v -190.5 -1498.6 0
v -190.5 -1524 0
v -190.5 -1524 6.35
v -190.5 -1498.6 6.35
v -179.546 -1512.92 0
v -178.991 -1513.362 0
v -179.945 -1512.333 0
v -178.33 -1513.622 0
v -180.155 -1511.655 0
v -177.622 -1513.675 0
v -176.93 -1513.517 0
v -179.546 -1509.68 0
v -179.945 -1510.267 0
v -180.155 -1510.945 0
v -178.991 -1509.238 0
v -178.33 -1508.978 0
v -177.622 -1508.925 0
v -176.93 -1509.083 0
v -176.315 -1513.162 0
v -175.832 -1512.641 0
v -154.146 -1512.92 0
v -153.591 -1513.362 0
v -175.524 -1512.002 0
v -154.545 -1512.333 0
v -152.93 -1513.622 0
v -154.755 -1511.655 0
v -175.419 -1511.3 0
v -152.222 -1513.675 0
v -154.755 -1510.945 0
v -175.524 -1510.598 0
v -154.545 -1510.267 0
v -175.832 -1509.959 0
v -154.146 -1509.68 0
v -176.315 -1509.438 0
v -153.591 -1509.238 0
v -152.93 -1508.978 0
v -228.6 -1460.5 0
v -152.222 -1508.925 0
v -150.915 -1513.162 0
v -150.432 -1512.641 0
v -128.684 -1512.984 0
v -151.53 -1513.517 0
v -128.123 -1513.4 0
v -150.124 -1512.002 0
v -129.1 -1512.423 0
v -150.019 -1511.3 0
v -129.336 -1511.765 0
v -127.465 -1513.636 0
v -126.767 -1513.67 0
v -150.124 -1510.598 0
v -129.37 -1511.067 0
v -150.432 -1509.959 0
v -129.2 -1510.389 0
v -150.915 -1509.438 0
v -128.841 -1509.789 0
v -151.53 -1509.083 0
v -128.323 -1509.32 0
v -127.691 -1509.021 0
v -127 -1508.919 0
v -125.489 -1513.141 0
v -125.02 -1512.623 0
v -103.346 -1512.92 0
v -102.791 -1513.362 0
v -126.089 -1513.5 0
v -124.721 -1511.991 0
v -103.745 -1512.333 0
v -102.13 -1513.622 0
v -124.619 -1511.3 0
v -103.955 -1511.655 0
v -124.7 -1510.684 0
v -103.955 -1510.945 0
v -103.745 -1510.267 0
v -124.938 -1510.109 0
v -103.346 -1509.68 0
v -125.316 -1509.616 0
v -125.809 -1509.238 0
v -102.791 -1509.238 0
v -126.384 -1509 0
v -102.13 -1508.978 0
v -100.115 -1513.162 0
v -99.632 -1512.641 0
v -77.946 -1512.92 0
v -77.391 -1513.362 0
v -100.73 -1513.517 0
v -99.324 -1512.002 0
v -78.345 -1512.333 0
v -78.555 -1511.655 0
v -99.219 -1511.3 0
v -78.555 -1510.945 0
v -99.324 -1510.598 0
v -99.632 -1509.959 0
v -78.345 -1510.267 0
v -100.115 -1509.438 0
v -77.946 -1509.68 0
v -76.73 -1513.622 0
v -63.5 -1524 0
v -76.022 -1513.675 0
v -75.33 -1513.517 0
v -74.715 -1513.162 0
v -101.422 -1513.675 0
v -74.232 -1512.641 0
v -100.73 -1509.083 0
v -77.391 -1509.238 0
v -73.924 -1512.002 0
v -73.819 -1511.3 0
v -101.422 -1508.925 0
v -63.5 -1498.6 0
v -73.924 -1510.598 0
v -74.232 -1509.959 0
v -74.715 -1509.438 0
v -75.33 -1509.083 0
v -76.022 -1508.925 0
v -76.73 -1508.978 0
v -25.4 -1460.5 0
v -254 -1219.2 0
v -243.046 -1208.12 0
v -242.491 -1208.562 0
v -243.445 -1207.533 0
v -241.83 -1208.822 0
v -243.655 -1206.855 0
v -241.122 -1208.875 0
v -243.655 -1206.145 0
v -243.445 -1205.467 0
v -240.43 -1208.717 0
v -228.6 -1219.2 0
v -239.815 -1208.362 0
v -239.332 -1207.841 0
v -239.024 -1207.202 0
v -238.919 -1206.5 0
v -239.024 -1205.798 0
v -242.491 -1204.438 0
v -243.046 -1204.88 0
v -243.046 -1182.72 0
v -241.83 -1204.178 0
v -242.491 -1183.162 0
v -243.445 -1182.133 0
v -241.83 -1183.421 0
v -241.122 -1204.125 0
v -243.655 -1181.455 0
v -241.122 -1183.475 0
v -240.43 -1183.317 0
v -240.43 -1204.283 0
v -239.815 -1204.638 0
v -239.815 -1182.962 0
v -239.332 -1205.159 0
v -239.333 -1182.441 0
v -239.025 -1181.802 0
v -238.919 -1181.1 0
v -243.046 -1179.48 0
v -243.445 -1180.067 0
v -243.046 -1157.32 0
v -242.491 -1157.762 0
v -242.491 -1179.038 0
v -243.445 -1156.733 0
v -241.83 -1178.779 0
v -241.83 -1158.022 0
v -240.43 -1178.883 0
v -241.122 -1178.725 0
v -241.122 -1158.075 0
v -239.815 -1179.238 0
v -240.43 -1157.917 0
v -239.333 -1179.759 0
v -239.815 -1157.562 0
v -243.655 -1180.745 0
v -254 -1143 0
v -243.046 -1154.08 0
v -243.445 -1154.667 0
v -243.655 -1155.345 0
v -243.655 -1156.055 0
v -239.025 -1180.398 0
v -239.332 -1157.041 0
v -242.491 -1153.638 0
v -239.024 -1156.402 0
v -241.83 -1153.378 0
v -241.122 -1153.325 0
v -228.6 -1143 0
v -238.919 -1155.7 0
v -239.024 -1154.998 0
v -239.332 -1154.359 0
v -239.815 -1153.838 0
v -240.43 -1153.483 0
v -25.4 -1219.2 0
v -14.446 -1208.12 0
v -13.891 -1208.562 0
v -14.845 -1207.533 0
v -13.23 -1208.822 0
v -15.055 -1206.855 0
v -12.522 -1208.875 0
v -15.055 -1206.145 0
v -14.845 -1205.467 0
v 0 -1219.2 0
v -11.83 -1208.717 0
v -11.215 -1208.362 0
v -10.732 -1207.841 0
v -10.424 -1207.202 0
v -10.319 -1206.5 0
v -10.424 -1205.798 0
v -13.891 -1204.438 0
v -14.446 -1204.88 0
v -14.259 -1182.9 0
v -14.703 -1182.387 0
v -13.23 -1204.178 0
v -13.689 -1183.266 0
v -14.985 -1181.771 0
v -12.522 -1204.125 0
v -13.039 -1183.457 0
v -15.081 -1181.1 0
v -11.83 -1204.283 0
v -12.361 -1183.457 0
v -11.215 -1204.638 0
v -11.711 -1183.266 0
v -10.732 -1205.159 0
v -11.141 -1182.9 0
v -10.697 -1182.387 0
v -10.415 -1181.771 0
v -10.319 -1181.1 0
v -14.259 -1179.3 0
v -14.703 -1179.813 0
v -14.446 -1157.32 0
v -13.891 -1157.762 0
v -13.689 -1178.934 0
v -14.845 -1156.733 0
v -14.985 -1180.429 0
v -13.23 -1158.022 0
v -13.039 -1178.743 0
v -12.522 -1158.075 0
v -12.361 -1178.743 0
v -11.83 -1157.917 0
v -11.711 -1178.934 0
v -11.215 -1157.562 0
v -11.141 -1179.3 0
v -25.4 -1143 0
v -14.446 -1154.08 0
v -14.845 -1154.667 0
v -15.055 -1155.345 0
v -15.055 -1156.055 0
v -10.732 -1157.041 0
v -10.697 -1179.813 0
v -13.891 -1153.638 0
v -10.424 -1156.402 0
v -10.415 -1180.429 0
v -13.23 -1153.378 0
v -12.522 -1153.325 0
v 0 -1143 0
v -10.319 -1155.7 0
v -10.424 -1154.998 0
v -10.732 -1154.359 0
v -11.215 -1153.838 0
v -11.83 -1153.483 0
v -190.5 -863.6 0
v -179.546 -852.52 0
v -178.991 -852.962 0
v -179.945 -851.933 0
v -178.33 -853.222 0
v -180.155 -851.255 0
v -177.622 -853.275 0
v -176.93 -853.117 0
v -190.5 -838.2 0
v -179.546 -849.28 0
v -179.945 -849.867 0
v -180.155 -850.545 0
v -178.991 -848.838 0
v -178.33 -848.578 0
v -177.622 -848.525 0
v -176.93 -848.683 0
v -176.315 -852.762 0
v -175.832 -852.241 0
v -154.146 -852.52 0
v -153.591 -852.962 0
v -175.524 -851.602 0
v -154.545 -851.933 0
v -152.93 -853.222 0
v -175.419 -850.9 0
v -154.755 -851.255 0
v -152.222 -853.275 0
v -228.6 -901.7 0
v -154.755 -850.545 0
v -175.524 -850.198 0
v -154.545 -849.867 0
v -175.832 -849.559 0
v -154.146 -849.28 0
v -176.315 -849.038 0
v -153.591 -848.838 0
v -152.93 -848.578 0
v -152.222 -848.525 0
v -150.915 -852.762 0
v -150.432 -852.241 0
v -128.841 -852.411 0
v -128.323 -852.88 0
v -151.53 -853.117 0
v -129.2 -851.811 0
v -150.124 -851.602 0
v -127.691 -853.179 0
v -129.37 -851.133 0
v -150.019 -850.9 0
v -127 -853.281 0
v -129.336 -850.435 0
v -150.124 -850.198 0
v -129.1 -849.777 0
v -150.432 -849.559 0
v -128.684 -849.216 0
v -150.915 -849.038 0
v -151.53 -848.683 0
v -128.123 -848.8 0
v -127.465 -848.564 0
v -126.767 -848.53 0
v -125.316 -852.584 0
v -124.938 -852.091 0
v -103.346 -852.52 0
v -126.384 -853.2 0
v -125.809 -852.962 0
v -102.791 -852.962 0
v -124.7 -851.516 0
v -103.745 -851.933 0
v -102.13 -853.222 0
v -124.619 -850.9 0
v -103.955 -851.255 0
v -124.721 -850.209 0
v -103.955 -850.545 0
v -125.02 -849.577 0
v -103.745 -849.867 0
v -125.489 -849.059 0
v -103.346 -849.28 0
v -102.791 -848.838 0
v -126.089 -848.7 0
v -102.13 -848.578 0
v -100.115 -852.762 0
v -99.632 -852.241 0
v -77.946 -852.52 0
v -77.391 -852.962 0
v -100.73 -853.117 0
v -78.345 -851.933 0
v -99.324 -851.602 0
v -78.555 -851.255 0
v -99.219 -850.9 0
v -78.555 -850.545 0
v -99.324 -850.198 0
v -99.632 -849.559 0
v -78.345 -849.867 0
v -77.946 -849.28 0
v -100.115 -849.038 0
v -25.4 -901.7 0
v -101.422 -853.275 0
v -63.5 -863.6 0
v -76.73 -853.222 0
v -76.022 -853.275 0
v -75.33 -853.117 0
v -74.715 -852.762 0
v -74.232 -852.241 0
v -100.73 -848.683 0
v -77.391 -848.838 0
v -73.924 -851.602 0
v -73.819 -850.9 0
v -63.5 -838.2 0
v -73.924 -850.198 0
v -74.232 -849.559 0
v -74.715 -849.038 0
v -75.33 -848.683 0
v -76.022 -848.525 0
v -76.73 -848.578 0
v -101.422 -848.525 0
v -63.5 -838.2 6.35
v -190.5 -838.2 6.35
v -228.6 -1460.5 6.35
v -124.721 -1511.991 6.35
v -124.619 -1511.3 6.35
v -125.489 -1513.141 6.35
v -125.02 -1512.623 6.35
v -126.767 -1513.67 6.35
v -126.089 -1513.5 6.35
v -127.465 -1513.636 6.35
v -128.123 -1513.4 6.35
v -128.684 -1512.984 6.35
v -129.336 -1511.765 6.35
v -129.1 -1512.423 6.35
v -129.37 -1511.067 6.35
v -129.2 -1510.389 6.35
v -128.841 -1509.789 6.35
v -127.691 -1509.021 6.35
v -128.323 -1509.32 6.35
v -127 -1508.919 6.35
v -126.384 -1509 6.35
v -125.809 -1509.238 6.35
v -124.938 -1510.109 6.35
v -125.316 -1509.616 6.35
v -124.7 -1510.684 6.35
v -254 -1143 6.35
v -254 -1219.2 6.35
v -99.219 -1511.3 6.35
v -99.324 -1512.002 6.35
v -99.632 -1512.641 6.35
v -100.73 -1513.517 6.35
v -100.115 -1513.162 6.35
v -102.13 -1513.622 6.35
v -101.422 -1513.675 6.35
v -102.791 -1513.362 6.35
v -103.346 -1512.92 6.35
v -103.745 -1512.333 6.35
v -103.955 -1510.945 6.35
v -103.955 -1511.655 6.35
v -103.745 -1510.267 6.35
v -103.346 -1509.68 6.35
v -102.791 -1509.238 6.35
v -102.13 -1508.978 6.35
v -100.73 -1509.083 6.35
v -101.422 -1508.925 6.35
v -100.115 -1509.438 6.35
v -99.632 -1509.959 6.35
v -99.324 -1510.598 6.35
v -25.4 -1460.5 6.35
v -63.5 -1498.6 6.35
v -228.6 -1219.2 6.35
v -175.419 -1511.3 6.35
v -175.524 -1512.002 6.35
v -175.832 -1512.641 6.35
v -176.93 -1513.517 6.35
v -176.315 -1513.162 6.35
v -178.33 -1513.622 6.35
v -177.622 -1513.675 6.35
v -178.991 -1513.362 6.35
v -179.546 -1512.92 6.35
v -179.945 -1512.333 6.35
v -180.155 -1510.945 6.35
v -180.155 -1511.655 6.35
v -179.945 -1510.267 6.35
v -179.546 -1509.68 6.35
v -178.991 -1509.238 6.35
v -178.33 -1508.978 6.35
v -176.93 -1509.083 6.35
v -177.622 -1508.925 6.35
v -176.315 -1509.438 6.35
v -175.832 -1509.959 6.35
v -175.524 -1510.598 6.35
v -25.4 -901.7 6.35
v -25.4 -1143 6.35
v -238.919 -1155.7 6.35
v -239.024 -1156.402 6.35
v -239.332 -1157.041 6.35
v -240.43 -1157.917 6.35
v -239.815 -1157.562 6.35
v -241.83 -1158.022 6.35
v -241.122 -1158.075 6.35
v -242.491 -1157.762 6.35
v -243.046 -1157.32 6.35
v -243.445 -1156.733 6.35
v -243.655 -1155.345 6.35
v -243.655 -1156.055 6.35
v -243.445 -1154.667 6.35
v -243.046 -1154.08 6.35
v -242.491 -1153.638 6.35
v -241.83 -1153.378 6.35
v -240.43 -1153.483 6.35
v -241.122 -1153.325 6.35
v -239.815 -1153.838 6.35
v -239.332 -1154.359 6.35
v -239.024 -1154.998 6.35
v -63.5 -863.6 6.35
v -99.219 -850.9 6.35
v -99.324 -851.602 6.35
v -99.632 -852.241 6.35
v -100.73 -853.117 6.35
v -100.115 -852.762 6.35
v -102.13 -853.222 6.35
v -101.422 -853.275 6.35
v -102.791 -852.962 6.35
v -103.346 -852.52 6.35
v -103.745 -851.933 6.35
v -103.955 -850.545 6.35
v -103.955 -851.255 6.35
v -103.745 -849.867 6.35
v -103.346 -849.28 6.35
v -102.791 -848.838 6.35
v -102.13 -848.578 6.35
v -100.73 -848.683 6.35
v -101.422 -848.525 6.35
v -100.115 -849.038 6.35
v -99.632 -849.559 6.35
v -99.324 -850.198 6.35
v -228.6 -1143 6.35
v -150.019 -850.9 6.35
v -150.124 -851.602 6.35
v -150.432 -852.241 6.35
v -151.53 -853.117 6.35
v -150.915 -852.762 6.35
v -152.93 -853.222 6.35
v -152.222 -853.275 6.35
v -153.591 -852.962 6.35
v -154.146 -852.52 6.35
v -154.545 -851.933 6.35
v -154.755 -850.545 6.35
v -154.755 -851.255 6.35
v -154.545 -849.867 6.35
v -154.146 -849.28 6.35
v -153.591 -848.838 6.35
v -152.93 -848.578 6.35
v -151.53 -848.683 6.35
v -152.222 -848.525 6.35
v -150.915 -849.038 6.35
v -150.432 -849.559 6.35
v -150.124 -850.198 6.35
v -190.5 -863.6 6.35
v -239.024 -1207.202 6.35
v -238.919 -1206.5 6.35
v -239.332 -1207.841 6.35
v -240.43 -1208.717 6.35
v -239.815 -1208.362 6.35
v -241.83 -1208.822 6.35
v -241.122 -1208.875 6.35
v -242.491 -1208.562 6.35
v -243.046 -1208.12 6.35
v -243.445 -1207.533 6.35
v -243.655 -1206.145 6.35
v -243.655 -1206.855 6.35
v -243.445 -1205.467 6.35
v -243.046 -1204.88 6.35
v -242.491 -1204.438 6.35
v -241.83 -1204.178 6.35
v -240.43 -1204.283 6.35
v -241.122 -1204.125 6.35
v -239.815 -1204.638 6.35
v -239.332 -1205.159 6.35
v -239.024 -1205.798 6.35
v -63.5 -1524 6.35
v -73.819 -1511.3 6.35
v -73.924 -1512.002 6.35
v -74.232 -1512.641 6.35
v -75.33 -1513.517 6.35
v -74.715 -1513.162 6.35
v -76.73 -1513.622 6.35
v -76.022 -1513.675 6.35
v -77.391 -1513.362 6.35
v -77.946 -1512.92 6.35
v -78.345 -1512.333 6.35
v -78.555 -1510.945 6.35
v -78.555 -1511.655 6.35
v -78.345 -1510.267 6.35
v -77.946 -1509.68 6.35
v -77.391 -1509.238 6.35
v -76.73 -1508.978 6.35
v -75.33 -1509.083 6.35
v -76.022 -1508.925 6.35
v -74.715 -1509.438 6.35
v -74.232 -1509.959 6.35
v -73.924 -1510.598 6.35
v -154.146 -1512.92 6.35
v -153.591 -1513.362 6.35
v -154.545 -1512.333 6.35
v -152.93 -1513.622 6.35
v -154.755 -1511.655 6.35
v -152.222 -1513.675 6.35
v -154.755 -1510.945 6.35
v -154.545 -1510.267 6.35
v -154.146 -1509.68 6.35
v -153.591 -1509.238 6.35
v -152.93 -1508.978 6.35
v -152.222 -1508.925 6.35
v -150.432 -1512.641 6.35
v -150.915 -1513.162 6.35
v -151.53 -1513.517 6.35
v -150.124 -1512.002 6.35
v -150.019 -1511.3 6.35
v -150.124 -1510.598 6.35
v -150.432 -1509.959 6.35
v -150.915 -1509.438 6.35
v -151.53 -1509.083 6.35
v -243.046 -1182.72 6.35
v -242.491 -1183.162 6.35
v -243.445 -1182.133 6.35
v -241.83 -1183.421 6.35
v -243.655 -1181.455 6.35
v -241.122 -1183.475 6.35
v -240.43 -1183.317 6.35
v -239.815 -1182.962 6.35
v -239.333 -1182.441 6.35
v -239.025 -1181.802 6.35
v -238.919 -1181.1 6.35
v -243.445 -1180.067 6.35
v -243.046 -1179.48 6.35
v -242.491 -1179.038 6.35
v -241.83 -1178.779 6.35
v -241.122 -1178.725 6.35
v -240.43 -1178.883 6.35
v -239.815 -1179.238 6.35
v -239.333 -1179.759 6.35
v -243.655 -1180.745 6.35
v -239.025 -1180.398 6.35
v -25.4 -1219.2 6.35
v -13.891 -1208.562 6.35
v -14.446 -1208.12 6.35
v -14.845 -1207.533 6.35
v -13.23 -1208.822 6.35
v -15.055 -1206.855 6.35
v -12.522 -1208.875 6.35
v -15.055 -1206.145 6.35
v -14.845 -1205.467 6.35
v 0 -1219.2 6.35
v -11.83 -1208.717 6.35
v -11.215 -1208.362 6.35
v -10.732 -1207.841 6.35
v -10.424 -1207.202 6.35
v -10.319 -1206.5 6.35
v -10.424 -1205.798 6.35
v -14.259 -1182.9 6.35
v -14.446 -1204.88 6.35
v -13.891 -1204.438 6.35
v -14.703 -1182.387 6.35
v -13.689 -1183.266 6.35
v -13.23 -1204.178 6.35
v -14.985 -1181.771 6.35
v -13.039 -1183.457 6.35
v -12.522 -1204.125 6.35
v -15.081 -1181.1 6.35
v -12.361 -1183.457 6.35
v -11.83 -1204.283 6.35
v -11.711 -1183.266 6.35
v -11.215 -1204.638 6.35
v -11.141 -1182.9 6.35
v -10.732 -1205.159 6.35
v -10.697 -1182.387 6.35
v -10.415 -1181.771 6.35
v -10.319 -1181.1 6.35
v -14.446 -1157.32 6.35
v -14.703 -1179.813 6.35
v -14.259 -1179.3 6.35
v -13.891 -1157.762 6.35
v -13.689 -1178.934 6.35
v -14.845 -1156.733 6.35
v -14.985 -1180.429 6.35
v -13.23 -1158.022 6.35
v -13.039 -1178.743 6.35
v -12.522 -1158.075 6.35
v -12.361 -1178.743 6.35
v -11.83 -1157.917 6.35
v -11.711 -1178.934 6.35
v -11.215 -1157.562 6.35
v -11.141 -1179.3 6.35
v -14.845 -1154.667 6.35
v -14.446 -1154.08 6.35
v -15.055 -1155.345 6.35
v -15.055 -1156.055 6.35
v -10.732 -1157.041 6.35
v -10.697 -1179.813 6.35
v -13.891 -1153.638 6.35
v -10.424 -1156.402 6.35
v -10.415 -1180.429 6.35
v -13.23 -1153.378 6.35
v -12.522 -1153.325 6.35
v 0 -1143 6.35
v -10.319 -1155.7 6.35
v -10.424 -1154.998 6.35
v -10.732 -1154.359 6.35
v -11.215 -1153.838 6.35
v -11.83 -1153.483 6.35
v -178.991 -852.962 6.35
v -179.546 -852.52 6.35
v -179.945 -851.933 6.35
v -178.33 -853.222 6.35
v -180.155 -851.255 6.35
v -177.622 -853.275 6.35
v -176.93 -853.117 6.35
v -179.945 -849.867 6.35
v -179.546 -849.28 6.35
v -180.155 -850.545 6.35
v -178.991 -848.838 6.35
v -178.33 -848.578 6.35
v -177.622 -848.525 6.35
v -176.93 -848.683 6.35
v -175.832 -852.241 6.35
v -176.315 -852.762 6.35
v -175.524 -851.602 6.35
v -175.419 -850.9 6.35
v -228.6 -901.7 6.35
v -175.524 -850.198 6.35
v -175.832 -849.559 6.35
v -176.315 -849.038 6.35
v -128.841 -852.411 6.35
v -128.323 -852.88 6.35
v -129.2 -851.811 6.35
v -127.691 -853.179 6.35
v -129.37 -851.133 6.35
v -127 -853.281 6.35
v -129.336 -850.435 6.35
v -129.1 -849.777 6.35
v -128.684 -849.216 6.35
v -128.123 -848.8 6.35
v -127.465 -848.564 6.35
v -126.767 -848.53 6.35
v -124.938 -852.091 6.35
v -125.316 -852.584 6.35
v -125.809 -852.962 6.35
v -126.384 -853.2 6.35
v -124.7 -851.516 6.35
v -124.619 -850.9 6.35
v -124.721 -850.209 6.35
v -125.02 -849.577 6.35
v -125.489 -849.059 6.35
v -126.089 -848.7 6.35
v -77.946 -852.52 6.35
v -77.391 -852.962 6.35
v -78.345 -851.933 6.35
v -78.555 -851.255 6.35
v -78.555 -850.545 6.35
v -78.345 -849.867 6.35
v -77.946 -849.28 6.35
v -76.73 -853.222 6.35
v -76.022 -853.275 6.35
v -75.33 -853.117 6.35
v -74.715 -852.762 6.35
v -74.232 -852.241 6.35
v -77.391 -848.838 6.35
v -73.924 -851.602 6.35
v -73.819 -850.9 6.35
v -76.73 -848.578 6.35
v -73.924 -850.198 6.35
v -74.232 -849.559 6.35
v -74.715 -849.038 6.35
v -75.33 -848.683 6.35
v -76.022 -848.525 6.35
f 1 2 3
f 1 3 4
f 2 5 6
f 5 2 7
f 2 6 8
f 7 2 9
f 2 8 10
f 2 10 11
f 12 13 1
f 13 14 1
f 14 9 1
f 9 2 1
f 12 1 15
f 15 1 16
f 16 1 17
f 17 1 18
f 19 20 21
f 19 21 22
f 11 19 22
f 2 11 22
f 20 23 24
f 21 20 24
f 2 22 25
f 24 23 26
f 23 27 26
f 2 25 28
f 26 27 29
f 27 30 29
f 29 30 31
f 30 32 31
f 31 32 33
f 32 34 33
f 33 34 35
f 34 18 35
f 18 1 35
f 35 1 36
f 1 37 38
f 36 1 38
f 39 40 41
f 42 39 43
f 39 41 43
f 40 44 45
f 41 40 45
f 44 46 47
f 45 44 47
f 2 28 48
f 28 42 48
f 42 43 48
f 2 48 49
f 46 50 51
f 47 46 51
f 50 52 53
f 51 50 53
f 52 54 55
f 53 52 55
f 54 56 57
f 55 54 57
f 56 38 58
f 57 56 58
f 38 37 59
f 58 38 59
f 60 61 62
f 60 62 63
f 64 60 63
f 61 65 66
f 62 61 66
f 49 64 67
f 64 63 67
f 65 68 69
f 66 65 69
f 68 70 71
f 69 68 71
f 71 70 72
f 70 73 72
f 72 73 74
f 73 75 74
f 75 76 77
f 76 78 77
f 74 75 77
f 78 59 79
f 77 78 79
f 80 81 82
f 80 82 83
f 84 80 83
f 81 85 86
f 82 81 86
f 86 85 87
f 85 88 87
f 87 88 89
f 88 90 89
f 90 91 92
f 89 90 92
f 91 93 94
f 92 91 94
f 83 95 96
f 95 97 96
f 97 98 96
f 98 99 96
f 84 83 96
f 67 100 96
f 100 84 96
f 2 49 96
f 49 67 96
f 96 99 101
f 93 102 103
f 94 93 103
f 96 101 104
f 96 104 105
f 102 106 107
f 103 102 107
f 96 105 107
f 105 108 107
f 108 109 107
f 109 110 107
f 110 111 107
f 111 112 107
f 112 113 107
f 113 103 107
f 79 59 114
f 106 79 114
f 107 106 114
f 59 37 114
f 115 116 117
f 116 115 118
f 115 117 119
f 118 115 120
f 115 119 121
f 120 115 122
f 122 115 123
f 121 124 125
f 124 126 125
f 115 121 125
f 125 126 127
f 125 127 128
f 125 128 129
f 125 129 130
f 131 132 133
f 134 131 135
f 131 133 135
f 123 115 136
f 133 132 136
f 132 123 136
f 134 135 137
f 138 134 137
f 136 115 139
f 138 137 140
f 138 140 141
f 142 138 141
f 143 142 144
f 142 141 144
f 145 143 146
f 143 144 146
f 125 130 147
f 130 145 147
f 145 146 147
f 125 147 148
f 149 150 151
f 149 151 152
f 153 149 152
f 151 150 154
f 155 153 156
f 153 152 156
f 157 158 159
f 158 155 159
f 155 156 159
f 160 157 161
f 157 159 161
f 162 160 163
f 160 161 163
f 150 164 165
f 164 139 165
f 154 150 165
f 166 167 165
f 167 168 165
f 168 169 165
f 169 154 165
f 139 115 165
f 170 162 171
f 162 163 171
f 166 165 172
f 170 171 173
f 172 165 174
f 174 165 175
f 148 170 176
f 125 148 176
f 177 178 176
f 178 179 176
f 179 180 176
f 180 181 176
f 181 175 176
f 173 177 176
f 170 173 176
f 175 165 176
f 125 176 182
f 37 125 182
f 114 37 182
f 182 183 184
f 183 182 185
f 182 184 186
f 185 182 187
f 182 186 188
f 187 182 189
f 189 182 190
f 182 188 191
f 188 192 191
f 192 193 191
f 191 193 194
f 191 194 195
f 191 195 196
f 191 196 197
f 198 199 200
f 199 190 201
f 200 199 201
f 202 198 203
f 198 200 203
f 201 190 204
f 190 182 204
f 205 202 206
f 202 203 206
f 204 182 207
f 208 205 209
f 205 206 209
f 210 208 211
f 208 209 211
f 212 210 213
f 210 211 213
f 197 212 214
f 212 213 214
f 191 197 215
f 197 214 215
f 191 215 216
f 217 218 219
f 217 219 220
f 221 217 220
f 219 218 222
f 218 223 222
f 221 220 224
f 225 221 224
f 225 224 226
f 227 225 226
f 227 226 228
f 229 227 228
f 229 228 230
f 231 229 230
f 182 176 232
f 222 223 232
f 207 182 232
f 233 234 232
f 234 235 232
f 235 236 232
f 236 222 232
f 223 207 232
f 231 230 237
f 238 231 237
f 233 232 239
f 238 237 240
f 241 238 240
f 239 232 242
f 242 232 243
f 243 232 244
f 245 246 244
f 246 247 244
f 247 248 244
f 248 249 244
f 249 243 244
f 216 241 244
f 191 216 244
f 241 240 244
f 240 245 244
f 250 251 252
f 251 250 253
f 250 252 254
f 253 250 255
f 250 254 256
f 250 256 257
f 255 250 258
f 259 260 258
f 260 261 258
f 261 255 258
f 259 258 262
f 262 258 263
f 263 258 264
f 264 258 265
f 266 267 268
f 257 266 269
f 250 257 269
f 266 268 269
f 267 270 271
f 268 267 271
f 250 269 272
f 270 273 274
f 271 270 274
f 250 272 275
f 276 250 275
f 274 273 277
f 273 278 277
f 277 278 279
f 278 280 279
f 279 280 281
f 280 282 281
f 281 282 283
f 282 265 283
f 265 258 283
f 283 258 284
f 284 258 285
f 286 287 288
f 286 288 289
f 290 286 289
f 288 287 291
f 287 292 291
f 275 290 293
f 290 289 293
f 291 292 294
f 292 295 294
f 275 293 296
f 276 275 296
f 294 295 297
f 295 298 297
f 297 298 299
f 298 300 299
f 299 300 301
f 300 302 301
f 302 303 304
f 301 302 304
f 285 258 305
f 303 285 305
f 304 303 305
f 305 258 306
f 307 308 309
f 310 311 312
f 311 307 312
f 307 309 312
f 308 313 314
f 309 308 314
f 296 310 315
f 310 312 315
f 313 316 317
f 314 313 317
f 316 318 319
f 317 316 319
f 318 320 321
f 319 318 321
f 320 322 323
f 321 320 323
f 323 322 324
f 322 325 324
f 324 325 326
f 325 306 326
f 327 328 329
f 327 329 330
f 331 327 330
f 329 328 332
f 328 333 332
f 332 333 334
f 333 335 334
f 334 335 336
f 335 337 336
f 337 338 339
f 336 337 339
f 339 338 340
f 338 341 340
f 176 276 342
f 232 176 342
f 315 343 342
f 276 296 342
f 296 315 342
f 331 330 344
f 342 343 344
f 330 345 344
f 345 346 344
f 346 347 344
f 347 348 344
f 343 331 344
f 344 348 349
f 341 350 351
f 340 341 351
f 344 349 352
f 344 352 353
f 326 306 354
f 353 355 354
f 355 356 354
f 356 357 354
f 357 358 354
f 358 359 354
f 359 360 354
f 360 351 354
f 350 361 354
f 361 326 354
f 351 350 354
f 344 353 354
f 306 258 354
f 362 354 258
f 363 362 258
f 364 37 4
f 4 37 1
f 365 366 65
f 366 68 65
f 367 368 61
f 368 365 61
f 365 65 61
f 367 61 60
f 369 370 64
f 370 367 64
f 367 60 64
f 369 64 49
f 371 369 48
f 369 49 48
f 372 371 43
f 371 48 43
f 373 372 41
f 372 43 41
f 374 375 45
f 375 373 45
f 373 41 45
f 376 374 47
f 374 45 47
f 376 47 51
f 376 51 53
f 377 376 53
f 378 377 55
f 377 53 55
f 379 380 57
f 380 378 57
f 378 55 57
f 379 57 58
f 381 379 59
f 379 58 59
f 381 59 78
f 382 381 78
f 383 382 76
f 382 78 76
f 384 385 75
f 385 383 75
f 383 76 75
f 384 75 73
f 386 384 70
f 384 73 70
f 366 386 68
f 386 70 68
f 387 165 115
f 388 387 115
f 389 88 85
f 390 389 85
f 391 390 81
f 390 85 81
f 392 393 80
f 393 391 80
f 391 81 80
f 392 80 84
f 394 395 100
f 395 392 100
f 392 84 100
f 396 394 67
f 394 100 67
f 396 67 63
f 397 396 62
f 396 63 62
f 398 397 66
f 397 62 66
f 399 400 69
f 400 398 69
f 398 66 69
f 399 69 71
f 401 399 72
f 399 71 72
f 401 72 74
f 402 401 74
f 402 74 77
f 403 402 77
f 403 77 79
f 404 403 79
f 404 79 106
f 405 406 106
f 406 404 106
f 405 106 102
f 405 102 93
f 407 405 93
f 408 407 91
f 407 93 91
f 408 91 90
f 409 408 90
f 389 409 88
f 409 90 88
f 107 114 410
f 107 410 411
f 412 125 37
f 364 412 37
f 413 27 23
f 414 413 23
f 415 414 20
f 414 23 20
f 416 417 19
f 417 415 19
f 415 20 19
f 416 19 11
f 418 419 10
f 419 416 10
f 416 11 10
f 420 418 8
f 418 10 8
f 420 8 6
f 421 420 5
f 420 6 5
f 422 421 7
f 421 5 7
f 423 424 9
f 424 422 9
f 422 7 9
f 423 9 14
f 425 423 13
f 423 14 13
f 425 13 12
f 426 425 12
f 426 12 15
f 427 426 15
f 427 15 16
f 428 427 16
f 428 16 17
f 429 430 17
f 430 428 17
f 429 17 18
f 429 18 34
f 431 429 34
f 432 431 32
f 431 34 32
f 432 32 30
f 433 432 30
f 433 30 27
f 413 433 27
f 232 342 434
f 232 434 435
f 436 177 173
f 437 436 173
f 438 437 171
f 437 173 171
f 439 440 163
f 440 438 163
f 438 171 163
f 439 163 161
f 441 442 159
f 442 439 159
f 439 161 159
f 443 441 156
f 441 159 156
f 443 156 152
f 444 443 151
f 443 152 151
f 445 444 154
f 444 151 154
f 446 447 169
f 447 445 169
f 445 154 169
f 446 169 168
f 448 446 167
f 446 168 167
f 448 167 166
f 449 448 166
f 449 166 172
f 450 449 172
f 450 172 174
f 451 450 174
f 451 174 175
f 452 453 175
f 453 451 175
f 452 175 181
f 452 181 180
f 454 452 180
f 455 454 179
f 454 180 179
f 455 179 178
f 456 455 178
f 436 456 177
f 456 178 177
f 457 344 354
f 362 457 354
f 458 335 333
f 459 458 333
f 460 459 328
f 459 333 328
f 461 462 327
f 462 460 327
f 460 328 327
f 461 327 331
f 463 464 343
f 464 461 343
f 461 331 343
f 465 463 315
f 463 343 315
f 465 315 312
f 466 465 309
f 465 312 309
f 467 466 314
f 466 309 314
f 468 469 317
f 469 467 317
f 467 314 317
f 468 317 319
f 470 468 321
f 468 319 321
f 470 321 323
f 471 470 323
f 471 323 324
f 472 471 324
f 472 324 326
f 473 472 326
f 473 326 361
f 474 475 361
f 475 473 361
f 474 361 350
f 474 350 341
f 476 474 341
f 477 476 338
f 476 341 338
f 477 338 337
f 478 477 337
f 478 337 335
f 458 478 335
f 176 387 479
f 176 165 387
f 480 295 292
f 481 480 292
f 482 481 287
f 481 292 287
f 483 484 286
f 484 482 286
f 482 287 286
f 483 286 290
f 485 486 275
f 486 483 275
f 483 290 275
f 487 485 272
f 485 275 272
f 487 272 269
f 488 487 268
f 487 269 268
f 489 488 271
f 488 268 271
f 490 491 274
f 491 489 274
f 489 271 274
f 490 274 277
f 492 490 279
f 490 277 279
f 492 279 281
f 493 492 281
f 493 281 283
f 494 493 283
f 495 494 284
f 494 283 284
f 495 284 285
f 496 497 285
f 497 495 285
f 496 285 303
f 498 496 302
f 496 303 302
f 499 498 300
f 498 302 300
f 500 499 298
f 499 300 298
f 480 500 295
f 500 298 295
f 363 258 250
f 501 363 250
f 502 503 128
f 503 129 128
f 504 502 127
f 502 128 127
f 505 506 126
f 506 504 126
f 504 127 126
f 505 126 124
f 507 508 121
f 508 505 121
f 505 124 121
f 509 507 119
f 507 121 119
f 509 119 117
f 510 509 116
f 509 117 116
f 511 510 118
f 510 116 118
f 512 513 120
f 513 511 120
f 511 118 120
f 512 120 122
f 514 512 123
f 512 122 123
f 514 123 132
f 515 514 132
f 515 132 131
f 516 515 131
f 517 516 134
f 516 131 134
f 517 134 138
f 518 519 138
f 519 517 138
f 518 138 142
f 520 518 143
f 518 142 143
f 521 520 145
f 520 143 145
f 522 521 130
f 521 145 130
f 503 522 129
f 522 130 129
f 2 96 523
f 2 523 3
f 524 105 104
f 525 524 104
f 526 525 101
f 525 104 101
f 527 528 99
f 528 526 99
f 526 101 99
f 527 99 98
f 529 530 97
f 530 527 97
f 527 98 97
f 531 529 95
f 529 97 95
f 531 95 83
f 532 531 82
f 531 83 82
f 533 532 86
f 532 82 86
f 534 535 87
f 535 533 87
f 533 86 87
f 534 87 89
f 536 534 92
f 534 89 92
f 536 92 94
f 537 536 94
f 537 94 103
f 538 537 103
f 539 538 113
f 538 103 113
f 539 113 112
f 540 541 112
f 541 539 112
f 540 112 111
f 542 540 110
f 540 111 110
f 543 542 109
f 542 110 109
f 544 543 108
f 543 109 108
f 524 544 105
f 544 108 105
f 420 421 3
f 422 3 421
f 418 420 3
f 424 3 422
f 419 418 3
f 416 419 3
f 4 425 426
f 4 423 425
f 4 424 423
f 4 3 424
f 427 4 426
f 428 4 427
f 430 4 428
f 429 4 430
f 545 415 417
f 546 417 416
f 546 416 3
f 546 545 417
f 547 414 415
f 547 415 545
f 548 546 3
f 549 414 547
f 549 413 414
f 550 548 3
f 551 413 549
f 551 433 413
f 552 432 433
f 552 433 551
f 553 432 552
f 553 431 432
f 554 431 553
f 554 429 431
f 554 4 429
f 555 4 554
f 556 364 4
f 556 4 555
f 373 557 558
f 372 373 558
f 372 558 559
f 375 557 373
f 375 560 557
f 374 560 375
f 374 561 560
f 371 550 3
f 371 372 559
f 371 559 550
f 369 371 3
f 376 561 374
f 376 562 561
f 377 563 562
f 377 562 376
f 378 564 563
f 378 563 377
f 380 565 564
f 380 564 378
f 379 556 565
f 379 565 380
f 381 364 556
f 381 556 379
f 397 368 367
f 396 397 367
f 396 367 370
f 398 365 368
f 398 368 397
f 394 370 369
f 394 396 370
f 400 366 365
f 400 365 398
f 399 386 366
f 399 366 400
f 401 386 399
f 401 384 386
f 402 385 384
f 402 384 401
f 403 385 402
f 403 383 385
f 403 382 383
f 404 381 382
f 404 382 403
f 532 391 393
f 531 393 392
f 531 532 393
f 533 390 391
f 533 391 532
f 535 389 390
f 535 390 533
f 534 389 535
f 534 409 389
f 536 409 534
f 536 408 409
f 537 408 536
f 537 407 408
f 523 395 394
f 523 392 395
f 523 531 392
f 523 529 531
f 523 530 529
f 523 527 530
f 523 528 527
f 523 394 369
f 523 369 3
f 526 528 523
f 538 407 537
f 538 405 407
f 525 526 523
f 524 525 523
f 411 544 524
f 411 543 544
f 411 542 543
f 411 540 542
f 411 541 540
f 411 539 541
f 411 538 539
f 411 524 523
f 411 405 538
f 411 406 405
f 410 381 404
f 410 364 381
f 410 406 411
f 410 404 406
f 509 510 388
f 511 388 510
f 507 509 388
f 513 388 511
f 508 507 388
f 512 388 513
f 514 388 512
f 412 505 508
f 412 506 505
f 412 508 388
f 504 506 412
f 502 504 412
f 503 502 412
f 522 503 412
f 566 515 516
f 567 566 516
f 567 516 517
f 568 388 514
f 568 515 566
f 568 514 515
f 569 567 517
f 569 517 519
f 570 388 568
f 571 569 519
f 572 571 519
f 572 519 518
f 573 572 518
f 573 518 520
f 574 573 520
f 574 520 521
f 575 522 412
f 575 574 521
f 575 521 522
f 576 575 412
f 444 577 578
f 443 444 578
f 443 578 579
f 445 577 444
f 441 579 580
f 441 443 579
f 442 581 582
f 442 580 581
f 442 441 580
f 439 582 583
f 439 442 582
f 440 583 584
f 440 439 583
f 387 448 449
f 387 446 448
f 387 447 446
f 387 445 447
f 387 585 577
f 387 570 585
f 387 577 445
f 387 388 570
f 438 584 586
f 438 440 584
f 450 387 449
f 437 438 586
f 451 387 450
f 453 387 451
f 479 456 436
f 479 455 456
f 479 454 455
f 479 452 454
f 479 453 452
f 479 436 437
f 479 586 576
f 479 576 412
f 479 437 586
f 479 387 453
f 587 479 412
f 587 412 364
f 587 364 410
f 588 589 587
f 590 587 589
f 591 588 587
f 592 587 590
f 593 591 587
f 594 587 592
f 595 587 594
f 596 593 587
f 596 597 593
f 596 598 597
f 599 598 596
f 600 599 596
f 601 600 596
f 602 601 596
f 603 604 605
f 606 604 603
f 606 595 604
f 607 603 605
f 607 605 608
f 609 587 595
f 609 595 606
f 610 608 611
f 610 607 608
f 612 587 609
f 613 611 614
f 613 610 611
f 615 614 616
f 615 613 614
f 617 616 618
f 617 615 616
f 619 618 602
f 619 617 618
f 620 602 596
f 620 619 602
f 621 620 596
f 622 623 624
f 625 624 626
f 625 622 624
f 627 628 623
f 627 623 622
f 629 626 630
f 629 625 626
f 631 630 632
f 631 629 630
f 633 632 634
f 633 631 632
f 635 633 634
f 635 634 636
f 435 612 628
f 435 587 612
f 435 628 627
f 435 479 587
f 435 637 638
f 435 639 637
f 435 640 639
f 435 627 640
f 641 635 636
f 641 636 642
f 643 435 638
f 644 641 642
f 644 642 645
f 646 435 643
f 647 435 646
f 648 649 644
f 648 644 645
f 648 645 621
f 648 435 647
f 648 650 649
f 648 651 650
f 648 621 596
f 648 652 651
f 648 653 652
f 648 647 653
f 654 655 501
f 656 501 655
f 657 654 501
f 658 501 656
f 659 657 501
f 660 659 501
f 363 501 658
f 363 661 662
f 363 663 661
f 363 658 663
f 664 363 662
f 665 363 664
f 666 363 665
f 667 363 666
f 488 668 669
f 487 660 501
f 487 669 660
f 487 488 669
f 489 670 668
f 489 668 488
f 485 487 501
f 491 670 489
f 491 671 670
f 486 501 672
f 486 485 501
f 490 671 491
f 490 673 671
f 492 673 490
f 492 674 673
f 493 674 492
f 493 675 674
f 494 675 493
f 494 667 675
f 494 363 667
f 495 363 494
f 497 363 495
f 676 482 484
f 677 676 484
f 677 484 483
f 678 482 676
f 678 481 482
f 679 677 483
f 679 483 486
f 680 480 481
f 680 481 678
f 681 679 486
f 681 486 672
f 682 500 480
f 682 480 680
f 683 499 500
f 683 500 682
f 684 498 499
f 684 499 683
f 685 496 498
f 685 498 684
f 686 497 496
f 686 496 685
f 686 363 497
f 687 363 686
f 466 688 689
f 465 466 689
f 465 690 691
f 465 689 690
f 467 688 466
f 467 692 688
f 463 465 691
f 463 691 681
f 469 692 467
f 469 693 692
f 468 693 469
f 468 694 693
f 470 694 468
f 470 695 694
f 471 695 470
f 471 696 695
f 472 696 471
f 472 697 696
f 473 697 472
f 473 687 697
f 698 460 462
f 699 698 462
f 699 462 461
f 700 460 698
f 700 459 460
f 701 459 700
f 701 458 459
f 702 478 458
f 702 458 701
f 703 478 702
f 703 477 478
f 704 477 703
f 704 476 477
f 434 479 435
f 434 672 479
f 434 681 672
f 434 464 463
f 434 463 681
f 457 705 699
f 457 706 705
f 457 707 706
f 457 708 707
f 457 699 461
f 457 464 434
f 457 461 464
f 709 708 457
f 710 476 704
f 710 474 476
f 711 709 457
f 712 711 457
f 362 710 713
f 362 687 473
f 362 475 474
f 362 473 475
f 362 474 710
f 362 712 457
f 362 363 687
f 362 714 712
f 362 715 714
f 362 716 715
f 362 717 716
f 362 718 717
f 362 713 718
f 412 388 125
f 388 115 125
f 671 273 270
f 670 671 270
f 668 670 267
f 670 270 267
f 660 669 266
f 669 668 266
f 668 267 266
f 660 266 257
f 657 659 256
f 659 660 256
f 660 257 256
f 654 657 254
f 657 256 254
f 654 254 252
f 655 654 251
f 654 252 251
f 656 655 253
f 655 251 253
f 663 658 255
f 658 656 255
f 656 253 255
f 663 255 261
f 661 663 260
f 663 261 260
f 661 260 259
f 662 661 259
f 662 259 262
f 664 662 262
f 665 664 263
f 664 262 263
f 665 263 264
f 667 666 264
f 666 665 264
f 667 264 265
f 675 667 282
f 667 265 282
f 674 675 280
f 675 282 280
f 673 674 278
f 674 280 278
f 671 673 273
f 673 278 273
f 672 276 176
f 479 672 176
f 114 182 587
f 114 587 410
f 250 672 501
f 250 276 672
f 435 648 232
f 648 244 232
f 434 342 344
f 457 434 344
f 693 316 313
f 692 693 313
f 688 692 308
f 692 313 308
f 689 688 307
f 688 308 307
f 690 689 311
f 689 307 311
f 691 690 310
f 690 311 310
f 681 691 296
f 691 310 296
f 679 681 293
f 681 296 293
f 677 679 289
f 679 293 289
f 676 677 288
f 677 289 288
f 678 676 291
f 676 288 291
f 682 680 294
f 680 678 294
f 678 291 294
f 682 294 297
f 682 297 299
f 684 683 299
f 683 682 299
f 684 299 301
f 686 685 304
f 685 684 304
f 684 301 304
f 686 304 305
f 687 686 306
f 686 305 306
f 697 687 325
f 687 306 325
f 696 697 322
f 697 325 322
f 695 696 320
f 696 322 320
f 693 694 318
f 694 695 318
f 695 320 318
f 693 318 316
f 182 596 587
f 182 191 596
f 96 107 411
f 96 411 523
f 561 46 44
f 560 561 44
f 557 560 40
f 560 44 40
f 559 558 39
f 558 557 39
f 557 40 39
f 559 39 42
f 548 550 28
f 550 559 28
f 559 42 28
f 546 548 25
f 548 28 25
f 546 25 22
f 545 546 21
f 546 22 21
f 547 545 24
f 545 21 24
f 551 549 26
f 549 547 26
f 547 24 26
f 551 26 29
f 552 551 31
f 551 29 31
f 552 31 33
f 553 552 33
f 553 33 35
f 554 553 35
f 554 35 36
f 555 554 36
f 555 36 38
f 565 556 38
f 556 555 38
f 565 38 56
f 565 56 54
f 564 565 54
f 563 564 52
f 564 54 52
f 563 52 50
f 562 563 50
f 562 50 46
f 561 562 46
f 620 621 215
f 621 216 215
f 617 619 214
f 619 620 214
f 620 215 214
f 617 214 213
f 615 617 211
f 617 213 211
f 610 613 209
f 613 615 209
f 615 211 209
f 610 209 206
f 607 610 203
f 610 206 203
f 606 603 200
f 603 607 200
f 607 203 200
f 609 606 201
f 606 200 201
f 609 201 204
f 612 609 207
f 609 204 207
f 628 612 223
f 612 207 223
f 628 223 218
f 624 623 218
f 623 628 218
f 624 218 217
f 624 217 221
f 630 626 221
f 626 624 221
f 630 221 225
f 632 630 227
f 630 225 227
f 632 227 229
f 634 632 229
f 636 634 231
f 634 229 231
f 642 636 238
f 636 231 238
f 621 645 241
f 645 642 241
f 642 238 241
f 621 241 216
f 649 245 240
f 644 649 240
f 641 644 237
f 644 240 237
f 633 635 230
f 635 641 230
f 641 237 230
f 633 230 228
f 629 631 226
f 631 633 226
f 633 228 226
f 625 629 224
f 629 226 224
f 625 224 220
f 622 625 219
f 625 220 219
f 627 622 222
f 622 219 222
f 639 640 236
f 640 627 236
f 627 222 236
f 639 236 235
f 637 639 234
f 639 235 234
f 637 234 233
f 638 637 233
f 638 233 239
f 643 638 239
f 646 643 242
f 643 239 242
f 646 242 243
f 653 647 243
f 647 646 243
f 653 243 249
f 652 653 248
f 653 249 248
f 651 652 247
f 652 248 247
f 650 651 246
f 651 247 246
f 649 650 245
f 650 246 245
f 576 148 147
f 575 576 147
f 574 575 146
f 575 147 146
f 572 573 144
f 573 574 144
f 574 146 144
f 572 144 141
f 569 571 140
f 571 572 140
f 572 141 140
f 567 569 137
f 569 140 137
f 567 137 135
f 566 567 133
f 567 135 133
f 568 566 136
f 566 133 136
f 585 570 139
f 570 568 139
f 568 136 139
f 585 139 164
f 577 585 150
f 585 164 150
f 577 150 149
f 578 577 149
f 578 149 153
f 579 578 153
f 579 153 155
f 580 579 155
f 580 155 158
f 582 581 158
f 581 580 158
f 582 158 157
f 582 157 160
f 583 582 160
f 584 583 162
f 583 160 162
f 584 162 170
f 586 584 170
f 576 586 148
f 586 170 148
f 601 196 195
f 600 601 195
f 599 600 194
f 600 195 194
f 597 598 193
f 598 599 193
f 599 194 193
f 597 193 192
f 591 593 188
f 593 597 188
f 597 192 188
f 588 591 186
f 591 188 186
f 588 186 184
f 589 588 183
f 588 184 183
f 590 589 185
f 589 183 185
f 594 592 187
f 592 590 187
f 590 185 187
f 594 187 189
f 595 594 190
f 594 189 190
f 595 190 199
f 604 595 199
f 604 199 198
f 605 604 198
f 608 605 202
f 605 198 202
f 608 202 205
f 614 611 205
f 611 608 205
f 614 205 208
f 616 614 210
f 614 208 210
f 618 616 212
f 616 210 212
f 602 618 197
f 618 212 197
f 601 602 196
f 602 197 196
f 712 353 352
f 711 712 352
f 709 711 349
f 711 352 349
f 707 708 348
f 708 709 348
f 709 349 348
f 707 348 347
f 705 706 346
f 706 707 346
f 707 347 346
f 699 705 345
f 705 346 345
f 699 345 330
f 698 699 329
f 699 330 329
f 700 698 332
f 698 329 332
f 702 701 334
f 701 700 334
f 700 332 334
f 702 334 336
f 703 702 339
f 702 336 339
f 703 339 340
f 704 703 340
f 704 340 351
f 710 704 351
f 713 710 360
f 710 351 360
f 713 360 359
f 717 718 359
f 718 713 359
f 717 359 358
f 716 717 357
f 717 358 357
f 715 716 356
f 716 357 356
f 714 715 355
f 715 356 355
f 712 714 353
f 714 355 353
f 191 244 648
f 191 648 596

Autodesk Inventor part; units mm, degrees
ref_plane "YZ Plane" through (0, 0, 0) normal (1, 0, 0) x (0, 1, 0)
ref_plane "XZ Plane" through (0, 0, 0) normal (0, 1, 0) x (-1, 0, 0)
ref_plane "XY Plane" through (0, 0, 0) normal (0, 0, 1) x (1, 0, 0)
ref_plane "Work Plane3" through (0, 0, 0) normal (0, 0, 1) x (1, 0, 0)
sketch "Sketch1" plane through (0, 0, 0) normal (0, 0, 1) x (1, 0, 0)
  line L0 (-25.4, -893.191) -> (-25.4, -866.775) projected
  line L1 (-25.4, -893.191) -> (-23.241, -895.35) projected
  line L2 (-2.159, -895.35) -> (-23.241, -895.35) projected
  line L3 (-2.159, -895.35) -> (0, -893.191) projected
  line L4 (0, -866.775) -> (0, -893.191) projected
  arc A0 (3.175, -863.6) -> (0, -866.775) centre (3.175, -866.775) ccw projected
  line L5 (29.591, -863.6) -> (3.175, -863.6) projected
  line L6 (29.591, -863.6) -> (31.75, -861.441) projected
  line L7 (31.75, -840.359) -> (31.75, -861.441) projected
  line L8 (31.75, -840.359) -> (29.591, -838.2) projected
  line L9 (-54.991, -838.2) -> (29.591, -838.2) projected
  line L10 (-54.991, -838.2) -> (-57.15, -840.359) projected
  line L11 (-57.15, -861.441) -> (-57.15, -840.359) projected
  line L12 (-57.15, -861.441) -> (-54.991, -863.6) projected
  line L13 (-28.575, -863.6) -> (-54.991, -863.6) projected
  arc A1 (-25.4, -866.775) -> (-28.575, -863.6) centre (-28.575, -866.775) ccw projected
  circle A2 centre (12.7, -850.9) radius 2.0701 projected
  circle A3 centre (0, -850.9) radius 2.0701 projected
  circle A4 centre (-25.4, -850.9) radius 2.0701 projected
  circle A5 centre (-50.8, -850.9) radius 2.0701 projected
  circle A6 centre (-12.7, -876.3) radius 2.0701 projected
  circle A7 centre (-12.7, -863.6) radius 2.0701 projected
  circle A8 centre (-38.1, -850.9) radius 2.0701 projected
  circle A9 centre (-12.7, -850.9) radius 2.0701 projected
  circle A10 centre (-12.7, -889) radius 2.0701 projected
  circle A11 centre (25.4, -850.9) radius 2.0701 projected
  line L14 (-25.4, -863.6) -> (-25.4, -1498.6) construction
  line L15 (107.95, -863.6) -> (-361.95, -863.6) projected
  line L16 (-254, -893.191) -> (-254, -866.775) projected
  line L17 (-254, -893.191) -> (-251.841, -895.35) projected
  line L18 (-230.759, -895.35) -> (-251.841, -895.35) projected
  line L19 (-230.759, -895.35) -> (-228.6, -893.191) projected
  line L20 (-228.6, -866.775) -> (-228.6, -893.191) projected
  arc A12 (-225.425, -863.6) -> (-228.6, -866.775) centre (-225.425, -866.775) ccw projected
  line L21 (-199.009, -863.6) -> (-225.425, -863.6) projected
  line L22 (-199.009, -863.6) -> (-196.85, -861.441) projected
  line L23 (-196.85, -840.359) -> (-196.85, -861.441) projected
  line L24 (-196.85, -840.359) -> (-199.009, -838.2) projected
  line L25 (-283.591, -838.2) -> (-199.009, -838.2) projected
  line L26 (-283.591, -838.2) -> (-285.75, -840.359) projected
  line L27 (-285.75, -861.441) -> (-285.75, -840.359) projected
  line L28 (-285.75, -861.441) -> (-283.591, -863.6) projected
  line L29 (-257.175, -863.6) -> (-283.591, -863.6) projected
  arc A13 (-254, -866.775) -> (-257.175, -863.6) centre (-257.175, -866.775) ccw projected
  circle A14 centre (-215.9, -850.9) radius 2.0701 projected
  circle A15 centre (-228.6, -850.9) radius 2.0701 projected
  circle A16 centre (-254, -850.9) radius 2.0701 projected
  circle A17 centre (-279.4, -850.9) radius 2.0701 projected
  circle A18 centre (-241.3, -876.3) radius 2.0701 projected
  circle A19 centre (-241.3, -863.6) radius 2.0701 projected
  circle A20 centre (-266.7, -850.9) radius 2.0701 projected
  circle A21 centre (-241.3, -850.9) radius 2.0701 projected
  circle A22 centre (-241.3, -889) radius 2.0701 projected
  circle A23 centre (-203.2, -850.9) radius 2.0701 projected
  line L30 (-228.6, -863.6) -> (-228.6, -1498.6) projected
  line L31 (-361.95, -1498.6) -> (107.95, -1498.6) projected
  line L32 (0, -1469.009) -> (0, -1495.425) projected
  line L33 (0, -1469.009) -> (-2.159, -1466.85) projected
  line L34 (-23.241, -1466.85) -> (-2.159, -1466.85) projected
  line L35 (-23.241, -1466.85) -> (-25.4, -1469.009) projected
  line L36 (-25.4, -1495.425) -> (-25.4, -1469.009) projected
  arc A24 (-28.575, -1498.6) -> (-25.4, -1495.425) centre (-28.575, -1495.425) ccw projected
  line L37 (-54.991, -1498.6) -> (-28.575, -1498.6) projected
  line L38 (-54.991, -1498.6) -> (-57.15, -1500.759) projected
  line L39 (-57.15, -1521.841) -> (-57.15, -1500.759) projected
  line L40 (-57.15, -1521.841) -> (-54.991, -1524) projected
  line L41 (29.591, -1524) -> (-54.991, -1524) projected
  line L42 (29.591, -1524) -> (31.75, -1521.841) projected
  line L43 (31.75, -1500.759) -> (31.75, -1521.841) projected
  line L44 (31.75, -1500.759) -> (29.591, -1498.6) projected
  line L45 (3.175, -1498.6) -> (29.591, -1498.6) projected
  arc A25 (0, -1495.425) -> (3.175, -1498.6) centre (3.175, -1495.425) ccw projected
  circle A26 centre (-38.1, -1511.3) radius 2.0701 projected
  circle A27 centre (-25.4, -1511.3) radius 2.0701 projected
  circle A28 centre (0, -1511.3) radius 2.0701 projected
  circle A29 centre (25.4, -1511.3) radius 2.0701 projected
  circle A30 centre (-12.7, -1485.9) radius 2.0701 projected
  circle A31 centre (-12.7, -1498.6) radius 2.0701 projected
  circle A32 centre (12.7, -1511.3) radius 2.0701 projected
  circle A33 centre (-12.7, -1511.3) radius 2.0701 projected
  circle A34 centre (-12.7, -1473.2) radius 2.0701 projected
  circle A35 centre (-50.8, -1511.3) radius 2.0701 projected
  line L46 (-228.6, -1469.009) -> (-228.6, -1495.425) projected
  line L47 (-228.6, -1469.009) -> (-230.759, -1466.85) projected
  line L48 (-251.841, -1466.85) -> (-230.759, -1466.85) projected
  line L49 (-251.841, -1466.85) -> (-254, -1469.009) projected
  line L50 (-254, -1495.425) -> (-254, -1469.009) projected
  arc A36 (-257.175, -1498.6) -> (-254, -1495.425) centre (-257.175, -1495.425) ccw projected
  line L51 (-283.591, -1498.6) -> (-257.175, -1498.6) projected
  line L52 (-283.591, -1498.6) -> (-285.75, -1500.759) projected
  line L53 (-285.75, -1521.841) -> (-285.75, -1500.759) projected
  line L54 (-285.75, -1521.841) -> (-283.591, -1524) projected
  line L55 (-199.009, -1524) -> (-283.591, -1524) projected
  line L56 (-199.009, -1524) -> (-196.85, -1521.841) projected
  line L57 (-196.85, -1500.759) -> (-196.85, -1521.841) projected
  line L58 (-196.85, -1500.759) -> (-199.009, -1498.6) projected
  line L59 (-225.425, -1498.6) -> (-199.009, -1498.6) projected
  arc A37 (-228.6, -1495.425) -> (-225.425, -1498.6) centre (-225.425, -1495.425) ccw projected
  circle A38 centre (-266.7, -1511.3) radius 2.0701 projected
  circle A39 centre (-254, -1511.3) radius 2.0701 projected
  circle A40 centre (-228.6, -1511.3) radius 2.0701 projected
  circle A41 centre (-203.2, -1511.3) radius 2.0701 projected
  circle A42 centre (-241.3, -1485.9) radius 2.0701 projected
  circle A43 centre (-241.3, -1498.6) radius 2.0701 projected
  circle A44 centre (-215.9, -1511.3) radius 2.0701 projected
  circle A45 centre (-241.3, -1511.3) radius 2.0701 projected
  circle A46 centre (-241.3, -1473.2) radius 2.0701 projected
  circle A47 centre (-279.4, -1511.3) radius 2.0701 projected
  circle A48 centre (-76.2, -850.9) radius 2.0701 projected
  circle A49 centre (-101.6, -850.9) radius 2.0701 projected
  circle A50 centre (-127, -850.9) radius 2.0701 projected
  circle A51 centre (-152.4, -850.9) radius 2.0701 projected
  circle A52 centre (-177.8, -850.9) radius 2.0701 projected
  circle A53 centre (-76.2, -1511.3) radius 2.0701 projected
  circle A54 centre (-101.6, -1511.3) radius 2.0701 projected
  circle A55 centre (-127, -1511.3) radius 2.0701 projected
  circle A56 centre (-152.4, -1511.3) radius 2.0701 projected
  circle A57 centre (-177.8, -1511.3) radius 2.0701 projected
  circle A58 centre (-241.3, -1155.7) radius 2.0701 projected
  circle A59 centre (-241.3, -1181.1) radius 2.0701 projected
  circle A60 centre (-241.3, -1206.5) radius 2.0701 projected
  circle A61 centre (-12.7, -1181.1) radius 2.0701 projected
  circle A62 centre (-12.7, -1206.5) radius 2.0701 projected
  circle A63 centre (-12.7, -1155.7) radius 2.0701 projected
  line L60 (-63.5, -863.6) -> (-63.5, -838.2)
  line L61 (-63.5, -838.2) -> (-190.5, -838.2)
  line L62 (-190.5, -838.2) -> (-190.5, -863.6)
  line L63 (-25.4, -901.7) -> (-25.4, -1143)
  line L64 (0, -1143) -> (0, -1219.2)
  line L65 (0, -1219.2) -> (-25.4, -1219.2)
  line L66 (0, -1143) -> (-25.4, -1143)
  line L67 (-25.4, -1219.2) -> (-25.4, -1460.5)
  circle A64 centre (-12.7, -1155.7) radius 2.3813
  circle A65 centre (-12.7, -1181.1) radius 2.3812
  circle A66 centre (-12.7, -1206.5) radius 2.3813
  line L68 (-25.4, -901.7) -> (-63.5, -863.6)
  line L69 (-12.7, -1181.1) -> (-241.3, -1181.1)
  line L70 (-127, -850.9) -> (-127, -1511.3)
  line L71 (-228.6, -901.7) -> (-228.6, -1143)
  line L72 (-254, -1143) -> (-254, -1219.2)
  line L73 (-254, -1219.2) -> (-228.6, -1219.2)
  line L74 (-254, -1143) -> (-228.6, -1143)
  line L75 (-228.6, -1219.2) -> (-228.6, -1460.5)
  circle A67 centre (-241.3, -1155.7) radius 2.3813
  circle A68 centre (-241.3, -1181.1) radius 2.3812
  circle A69 centre (-241.3, -1206.5) radius 2.3813
  line L76 (-228.6, -901.7) -> (-190.5, -863.6)
  circle A70 centre (-177.8, -850.9) radius 2.3813
  circle A71 centre (-152.4, -850.9) radius 2.3813
  circle A72 centre (-127, -850.9) radius 2.3813
  circle A73 centre (-101.6, -850.9) radius 2.3813
  circle A74 centre (-76.2, -850.9) radius 2.3813
  line L77 (-63.5, -1498.6) -> (-63.5, -1524)
  line L78 (-63.5, -1524) -> (-190.5, -1524)
  line L79 (-190.5, -1524) -> (-190.5, -1498.6)
  line L80 (-25.4, -1460.5) -> (-63.5, -1498.6)
  line L81 (-228.6, -1460.5) -> (-190.5, -1498.6)
  circle A75 centre (-177.8, -1511.3) radius 2.3813
  circle A76 centre (-152.4, -1511.3) radius 2.3813
  circle A77 centre (-127, -1511.3) radius 2.3813
  circle A78 centre (-101.6, -1511.3) radius 2.3813
  circle A79 centre (-76.2, -1511.3) radius 2.3813
  point P0 (0, 0)
  dimension "d0" = 6.35
  dimension "d1" = 6.35
  dimension "d2" = 25.4
  dimension "d3" = 6.35
  dimension "d4" = 6.35
  dimension "d5" = 25.4
  dimension "d6" = 12.7
  dimension "d7" = 12.7
  dimension "d8" = 4.7625
  dimension "d9" = 4.7625
  dimension "d10" = 4.7625
extrude "Extrusion1" add sketch "Sketch1" along normal blind 6.35 contours L68 L63 L66 L64 L65 L67 L80 L31 L70 L15 | L15 L62 L61 L60 | L70 L69 L30 L76 L15 | L70 L31 L81 L30 L69 | L30 L73 L72 L74 | L31 L77 L78 L79
equation "\"d9\" = d8"
equation "\"d10\" = d8"
properties part number "Test_Swerve_Center" material "PMMA Plastic"
